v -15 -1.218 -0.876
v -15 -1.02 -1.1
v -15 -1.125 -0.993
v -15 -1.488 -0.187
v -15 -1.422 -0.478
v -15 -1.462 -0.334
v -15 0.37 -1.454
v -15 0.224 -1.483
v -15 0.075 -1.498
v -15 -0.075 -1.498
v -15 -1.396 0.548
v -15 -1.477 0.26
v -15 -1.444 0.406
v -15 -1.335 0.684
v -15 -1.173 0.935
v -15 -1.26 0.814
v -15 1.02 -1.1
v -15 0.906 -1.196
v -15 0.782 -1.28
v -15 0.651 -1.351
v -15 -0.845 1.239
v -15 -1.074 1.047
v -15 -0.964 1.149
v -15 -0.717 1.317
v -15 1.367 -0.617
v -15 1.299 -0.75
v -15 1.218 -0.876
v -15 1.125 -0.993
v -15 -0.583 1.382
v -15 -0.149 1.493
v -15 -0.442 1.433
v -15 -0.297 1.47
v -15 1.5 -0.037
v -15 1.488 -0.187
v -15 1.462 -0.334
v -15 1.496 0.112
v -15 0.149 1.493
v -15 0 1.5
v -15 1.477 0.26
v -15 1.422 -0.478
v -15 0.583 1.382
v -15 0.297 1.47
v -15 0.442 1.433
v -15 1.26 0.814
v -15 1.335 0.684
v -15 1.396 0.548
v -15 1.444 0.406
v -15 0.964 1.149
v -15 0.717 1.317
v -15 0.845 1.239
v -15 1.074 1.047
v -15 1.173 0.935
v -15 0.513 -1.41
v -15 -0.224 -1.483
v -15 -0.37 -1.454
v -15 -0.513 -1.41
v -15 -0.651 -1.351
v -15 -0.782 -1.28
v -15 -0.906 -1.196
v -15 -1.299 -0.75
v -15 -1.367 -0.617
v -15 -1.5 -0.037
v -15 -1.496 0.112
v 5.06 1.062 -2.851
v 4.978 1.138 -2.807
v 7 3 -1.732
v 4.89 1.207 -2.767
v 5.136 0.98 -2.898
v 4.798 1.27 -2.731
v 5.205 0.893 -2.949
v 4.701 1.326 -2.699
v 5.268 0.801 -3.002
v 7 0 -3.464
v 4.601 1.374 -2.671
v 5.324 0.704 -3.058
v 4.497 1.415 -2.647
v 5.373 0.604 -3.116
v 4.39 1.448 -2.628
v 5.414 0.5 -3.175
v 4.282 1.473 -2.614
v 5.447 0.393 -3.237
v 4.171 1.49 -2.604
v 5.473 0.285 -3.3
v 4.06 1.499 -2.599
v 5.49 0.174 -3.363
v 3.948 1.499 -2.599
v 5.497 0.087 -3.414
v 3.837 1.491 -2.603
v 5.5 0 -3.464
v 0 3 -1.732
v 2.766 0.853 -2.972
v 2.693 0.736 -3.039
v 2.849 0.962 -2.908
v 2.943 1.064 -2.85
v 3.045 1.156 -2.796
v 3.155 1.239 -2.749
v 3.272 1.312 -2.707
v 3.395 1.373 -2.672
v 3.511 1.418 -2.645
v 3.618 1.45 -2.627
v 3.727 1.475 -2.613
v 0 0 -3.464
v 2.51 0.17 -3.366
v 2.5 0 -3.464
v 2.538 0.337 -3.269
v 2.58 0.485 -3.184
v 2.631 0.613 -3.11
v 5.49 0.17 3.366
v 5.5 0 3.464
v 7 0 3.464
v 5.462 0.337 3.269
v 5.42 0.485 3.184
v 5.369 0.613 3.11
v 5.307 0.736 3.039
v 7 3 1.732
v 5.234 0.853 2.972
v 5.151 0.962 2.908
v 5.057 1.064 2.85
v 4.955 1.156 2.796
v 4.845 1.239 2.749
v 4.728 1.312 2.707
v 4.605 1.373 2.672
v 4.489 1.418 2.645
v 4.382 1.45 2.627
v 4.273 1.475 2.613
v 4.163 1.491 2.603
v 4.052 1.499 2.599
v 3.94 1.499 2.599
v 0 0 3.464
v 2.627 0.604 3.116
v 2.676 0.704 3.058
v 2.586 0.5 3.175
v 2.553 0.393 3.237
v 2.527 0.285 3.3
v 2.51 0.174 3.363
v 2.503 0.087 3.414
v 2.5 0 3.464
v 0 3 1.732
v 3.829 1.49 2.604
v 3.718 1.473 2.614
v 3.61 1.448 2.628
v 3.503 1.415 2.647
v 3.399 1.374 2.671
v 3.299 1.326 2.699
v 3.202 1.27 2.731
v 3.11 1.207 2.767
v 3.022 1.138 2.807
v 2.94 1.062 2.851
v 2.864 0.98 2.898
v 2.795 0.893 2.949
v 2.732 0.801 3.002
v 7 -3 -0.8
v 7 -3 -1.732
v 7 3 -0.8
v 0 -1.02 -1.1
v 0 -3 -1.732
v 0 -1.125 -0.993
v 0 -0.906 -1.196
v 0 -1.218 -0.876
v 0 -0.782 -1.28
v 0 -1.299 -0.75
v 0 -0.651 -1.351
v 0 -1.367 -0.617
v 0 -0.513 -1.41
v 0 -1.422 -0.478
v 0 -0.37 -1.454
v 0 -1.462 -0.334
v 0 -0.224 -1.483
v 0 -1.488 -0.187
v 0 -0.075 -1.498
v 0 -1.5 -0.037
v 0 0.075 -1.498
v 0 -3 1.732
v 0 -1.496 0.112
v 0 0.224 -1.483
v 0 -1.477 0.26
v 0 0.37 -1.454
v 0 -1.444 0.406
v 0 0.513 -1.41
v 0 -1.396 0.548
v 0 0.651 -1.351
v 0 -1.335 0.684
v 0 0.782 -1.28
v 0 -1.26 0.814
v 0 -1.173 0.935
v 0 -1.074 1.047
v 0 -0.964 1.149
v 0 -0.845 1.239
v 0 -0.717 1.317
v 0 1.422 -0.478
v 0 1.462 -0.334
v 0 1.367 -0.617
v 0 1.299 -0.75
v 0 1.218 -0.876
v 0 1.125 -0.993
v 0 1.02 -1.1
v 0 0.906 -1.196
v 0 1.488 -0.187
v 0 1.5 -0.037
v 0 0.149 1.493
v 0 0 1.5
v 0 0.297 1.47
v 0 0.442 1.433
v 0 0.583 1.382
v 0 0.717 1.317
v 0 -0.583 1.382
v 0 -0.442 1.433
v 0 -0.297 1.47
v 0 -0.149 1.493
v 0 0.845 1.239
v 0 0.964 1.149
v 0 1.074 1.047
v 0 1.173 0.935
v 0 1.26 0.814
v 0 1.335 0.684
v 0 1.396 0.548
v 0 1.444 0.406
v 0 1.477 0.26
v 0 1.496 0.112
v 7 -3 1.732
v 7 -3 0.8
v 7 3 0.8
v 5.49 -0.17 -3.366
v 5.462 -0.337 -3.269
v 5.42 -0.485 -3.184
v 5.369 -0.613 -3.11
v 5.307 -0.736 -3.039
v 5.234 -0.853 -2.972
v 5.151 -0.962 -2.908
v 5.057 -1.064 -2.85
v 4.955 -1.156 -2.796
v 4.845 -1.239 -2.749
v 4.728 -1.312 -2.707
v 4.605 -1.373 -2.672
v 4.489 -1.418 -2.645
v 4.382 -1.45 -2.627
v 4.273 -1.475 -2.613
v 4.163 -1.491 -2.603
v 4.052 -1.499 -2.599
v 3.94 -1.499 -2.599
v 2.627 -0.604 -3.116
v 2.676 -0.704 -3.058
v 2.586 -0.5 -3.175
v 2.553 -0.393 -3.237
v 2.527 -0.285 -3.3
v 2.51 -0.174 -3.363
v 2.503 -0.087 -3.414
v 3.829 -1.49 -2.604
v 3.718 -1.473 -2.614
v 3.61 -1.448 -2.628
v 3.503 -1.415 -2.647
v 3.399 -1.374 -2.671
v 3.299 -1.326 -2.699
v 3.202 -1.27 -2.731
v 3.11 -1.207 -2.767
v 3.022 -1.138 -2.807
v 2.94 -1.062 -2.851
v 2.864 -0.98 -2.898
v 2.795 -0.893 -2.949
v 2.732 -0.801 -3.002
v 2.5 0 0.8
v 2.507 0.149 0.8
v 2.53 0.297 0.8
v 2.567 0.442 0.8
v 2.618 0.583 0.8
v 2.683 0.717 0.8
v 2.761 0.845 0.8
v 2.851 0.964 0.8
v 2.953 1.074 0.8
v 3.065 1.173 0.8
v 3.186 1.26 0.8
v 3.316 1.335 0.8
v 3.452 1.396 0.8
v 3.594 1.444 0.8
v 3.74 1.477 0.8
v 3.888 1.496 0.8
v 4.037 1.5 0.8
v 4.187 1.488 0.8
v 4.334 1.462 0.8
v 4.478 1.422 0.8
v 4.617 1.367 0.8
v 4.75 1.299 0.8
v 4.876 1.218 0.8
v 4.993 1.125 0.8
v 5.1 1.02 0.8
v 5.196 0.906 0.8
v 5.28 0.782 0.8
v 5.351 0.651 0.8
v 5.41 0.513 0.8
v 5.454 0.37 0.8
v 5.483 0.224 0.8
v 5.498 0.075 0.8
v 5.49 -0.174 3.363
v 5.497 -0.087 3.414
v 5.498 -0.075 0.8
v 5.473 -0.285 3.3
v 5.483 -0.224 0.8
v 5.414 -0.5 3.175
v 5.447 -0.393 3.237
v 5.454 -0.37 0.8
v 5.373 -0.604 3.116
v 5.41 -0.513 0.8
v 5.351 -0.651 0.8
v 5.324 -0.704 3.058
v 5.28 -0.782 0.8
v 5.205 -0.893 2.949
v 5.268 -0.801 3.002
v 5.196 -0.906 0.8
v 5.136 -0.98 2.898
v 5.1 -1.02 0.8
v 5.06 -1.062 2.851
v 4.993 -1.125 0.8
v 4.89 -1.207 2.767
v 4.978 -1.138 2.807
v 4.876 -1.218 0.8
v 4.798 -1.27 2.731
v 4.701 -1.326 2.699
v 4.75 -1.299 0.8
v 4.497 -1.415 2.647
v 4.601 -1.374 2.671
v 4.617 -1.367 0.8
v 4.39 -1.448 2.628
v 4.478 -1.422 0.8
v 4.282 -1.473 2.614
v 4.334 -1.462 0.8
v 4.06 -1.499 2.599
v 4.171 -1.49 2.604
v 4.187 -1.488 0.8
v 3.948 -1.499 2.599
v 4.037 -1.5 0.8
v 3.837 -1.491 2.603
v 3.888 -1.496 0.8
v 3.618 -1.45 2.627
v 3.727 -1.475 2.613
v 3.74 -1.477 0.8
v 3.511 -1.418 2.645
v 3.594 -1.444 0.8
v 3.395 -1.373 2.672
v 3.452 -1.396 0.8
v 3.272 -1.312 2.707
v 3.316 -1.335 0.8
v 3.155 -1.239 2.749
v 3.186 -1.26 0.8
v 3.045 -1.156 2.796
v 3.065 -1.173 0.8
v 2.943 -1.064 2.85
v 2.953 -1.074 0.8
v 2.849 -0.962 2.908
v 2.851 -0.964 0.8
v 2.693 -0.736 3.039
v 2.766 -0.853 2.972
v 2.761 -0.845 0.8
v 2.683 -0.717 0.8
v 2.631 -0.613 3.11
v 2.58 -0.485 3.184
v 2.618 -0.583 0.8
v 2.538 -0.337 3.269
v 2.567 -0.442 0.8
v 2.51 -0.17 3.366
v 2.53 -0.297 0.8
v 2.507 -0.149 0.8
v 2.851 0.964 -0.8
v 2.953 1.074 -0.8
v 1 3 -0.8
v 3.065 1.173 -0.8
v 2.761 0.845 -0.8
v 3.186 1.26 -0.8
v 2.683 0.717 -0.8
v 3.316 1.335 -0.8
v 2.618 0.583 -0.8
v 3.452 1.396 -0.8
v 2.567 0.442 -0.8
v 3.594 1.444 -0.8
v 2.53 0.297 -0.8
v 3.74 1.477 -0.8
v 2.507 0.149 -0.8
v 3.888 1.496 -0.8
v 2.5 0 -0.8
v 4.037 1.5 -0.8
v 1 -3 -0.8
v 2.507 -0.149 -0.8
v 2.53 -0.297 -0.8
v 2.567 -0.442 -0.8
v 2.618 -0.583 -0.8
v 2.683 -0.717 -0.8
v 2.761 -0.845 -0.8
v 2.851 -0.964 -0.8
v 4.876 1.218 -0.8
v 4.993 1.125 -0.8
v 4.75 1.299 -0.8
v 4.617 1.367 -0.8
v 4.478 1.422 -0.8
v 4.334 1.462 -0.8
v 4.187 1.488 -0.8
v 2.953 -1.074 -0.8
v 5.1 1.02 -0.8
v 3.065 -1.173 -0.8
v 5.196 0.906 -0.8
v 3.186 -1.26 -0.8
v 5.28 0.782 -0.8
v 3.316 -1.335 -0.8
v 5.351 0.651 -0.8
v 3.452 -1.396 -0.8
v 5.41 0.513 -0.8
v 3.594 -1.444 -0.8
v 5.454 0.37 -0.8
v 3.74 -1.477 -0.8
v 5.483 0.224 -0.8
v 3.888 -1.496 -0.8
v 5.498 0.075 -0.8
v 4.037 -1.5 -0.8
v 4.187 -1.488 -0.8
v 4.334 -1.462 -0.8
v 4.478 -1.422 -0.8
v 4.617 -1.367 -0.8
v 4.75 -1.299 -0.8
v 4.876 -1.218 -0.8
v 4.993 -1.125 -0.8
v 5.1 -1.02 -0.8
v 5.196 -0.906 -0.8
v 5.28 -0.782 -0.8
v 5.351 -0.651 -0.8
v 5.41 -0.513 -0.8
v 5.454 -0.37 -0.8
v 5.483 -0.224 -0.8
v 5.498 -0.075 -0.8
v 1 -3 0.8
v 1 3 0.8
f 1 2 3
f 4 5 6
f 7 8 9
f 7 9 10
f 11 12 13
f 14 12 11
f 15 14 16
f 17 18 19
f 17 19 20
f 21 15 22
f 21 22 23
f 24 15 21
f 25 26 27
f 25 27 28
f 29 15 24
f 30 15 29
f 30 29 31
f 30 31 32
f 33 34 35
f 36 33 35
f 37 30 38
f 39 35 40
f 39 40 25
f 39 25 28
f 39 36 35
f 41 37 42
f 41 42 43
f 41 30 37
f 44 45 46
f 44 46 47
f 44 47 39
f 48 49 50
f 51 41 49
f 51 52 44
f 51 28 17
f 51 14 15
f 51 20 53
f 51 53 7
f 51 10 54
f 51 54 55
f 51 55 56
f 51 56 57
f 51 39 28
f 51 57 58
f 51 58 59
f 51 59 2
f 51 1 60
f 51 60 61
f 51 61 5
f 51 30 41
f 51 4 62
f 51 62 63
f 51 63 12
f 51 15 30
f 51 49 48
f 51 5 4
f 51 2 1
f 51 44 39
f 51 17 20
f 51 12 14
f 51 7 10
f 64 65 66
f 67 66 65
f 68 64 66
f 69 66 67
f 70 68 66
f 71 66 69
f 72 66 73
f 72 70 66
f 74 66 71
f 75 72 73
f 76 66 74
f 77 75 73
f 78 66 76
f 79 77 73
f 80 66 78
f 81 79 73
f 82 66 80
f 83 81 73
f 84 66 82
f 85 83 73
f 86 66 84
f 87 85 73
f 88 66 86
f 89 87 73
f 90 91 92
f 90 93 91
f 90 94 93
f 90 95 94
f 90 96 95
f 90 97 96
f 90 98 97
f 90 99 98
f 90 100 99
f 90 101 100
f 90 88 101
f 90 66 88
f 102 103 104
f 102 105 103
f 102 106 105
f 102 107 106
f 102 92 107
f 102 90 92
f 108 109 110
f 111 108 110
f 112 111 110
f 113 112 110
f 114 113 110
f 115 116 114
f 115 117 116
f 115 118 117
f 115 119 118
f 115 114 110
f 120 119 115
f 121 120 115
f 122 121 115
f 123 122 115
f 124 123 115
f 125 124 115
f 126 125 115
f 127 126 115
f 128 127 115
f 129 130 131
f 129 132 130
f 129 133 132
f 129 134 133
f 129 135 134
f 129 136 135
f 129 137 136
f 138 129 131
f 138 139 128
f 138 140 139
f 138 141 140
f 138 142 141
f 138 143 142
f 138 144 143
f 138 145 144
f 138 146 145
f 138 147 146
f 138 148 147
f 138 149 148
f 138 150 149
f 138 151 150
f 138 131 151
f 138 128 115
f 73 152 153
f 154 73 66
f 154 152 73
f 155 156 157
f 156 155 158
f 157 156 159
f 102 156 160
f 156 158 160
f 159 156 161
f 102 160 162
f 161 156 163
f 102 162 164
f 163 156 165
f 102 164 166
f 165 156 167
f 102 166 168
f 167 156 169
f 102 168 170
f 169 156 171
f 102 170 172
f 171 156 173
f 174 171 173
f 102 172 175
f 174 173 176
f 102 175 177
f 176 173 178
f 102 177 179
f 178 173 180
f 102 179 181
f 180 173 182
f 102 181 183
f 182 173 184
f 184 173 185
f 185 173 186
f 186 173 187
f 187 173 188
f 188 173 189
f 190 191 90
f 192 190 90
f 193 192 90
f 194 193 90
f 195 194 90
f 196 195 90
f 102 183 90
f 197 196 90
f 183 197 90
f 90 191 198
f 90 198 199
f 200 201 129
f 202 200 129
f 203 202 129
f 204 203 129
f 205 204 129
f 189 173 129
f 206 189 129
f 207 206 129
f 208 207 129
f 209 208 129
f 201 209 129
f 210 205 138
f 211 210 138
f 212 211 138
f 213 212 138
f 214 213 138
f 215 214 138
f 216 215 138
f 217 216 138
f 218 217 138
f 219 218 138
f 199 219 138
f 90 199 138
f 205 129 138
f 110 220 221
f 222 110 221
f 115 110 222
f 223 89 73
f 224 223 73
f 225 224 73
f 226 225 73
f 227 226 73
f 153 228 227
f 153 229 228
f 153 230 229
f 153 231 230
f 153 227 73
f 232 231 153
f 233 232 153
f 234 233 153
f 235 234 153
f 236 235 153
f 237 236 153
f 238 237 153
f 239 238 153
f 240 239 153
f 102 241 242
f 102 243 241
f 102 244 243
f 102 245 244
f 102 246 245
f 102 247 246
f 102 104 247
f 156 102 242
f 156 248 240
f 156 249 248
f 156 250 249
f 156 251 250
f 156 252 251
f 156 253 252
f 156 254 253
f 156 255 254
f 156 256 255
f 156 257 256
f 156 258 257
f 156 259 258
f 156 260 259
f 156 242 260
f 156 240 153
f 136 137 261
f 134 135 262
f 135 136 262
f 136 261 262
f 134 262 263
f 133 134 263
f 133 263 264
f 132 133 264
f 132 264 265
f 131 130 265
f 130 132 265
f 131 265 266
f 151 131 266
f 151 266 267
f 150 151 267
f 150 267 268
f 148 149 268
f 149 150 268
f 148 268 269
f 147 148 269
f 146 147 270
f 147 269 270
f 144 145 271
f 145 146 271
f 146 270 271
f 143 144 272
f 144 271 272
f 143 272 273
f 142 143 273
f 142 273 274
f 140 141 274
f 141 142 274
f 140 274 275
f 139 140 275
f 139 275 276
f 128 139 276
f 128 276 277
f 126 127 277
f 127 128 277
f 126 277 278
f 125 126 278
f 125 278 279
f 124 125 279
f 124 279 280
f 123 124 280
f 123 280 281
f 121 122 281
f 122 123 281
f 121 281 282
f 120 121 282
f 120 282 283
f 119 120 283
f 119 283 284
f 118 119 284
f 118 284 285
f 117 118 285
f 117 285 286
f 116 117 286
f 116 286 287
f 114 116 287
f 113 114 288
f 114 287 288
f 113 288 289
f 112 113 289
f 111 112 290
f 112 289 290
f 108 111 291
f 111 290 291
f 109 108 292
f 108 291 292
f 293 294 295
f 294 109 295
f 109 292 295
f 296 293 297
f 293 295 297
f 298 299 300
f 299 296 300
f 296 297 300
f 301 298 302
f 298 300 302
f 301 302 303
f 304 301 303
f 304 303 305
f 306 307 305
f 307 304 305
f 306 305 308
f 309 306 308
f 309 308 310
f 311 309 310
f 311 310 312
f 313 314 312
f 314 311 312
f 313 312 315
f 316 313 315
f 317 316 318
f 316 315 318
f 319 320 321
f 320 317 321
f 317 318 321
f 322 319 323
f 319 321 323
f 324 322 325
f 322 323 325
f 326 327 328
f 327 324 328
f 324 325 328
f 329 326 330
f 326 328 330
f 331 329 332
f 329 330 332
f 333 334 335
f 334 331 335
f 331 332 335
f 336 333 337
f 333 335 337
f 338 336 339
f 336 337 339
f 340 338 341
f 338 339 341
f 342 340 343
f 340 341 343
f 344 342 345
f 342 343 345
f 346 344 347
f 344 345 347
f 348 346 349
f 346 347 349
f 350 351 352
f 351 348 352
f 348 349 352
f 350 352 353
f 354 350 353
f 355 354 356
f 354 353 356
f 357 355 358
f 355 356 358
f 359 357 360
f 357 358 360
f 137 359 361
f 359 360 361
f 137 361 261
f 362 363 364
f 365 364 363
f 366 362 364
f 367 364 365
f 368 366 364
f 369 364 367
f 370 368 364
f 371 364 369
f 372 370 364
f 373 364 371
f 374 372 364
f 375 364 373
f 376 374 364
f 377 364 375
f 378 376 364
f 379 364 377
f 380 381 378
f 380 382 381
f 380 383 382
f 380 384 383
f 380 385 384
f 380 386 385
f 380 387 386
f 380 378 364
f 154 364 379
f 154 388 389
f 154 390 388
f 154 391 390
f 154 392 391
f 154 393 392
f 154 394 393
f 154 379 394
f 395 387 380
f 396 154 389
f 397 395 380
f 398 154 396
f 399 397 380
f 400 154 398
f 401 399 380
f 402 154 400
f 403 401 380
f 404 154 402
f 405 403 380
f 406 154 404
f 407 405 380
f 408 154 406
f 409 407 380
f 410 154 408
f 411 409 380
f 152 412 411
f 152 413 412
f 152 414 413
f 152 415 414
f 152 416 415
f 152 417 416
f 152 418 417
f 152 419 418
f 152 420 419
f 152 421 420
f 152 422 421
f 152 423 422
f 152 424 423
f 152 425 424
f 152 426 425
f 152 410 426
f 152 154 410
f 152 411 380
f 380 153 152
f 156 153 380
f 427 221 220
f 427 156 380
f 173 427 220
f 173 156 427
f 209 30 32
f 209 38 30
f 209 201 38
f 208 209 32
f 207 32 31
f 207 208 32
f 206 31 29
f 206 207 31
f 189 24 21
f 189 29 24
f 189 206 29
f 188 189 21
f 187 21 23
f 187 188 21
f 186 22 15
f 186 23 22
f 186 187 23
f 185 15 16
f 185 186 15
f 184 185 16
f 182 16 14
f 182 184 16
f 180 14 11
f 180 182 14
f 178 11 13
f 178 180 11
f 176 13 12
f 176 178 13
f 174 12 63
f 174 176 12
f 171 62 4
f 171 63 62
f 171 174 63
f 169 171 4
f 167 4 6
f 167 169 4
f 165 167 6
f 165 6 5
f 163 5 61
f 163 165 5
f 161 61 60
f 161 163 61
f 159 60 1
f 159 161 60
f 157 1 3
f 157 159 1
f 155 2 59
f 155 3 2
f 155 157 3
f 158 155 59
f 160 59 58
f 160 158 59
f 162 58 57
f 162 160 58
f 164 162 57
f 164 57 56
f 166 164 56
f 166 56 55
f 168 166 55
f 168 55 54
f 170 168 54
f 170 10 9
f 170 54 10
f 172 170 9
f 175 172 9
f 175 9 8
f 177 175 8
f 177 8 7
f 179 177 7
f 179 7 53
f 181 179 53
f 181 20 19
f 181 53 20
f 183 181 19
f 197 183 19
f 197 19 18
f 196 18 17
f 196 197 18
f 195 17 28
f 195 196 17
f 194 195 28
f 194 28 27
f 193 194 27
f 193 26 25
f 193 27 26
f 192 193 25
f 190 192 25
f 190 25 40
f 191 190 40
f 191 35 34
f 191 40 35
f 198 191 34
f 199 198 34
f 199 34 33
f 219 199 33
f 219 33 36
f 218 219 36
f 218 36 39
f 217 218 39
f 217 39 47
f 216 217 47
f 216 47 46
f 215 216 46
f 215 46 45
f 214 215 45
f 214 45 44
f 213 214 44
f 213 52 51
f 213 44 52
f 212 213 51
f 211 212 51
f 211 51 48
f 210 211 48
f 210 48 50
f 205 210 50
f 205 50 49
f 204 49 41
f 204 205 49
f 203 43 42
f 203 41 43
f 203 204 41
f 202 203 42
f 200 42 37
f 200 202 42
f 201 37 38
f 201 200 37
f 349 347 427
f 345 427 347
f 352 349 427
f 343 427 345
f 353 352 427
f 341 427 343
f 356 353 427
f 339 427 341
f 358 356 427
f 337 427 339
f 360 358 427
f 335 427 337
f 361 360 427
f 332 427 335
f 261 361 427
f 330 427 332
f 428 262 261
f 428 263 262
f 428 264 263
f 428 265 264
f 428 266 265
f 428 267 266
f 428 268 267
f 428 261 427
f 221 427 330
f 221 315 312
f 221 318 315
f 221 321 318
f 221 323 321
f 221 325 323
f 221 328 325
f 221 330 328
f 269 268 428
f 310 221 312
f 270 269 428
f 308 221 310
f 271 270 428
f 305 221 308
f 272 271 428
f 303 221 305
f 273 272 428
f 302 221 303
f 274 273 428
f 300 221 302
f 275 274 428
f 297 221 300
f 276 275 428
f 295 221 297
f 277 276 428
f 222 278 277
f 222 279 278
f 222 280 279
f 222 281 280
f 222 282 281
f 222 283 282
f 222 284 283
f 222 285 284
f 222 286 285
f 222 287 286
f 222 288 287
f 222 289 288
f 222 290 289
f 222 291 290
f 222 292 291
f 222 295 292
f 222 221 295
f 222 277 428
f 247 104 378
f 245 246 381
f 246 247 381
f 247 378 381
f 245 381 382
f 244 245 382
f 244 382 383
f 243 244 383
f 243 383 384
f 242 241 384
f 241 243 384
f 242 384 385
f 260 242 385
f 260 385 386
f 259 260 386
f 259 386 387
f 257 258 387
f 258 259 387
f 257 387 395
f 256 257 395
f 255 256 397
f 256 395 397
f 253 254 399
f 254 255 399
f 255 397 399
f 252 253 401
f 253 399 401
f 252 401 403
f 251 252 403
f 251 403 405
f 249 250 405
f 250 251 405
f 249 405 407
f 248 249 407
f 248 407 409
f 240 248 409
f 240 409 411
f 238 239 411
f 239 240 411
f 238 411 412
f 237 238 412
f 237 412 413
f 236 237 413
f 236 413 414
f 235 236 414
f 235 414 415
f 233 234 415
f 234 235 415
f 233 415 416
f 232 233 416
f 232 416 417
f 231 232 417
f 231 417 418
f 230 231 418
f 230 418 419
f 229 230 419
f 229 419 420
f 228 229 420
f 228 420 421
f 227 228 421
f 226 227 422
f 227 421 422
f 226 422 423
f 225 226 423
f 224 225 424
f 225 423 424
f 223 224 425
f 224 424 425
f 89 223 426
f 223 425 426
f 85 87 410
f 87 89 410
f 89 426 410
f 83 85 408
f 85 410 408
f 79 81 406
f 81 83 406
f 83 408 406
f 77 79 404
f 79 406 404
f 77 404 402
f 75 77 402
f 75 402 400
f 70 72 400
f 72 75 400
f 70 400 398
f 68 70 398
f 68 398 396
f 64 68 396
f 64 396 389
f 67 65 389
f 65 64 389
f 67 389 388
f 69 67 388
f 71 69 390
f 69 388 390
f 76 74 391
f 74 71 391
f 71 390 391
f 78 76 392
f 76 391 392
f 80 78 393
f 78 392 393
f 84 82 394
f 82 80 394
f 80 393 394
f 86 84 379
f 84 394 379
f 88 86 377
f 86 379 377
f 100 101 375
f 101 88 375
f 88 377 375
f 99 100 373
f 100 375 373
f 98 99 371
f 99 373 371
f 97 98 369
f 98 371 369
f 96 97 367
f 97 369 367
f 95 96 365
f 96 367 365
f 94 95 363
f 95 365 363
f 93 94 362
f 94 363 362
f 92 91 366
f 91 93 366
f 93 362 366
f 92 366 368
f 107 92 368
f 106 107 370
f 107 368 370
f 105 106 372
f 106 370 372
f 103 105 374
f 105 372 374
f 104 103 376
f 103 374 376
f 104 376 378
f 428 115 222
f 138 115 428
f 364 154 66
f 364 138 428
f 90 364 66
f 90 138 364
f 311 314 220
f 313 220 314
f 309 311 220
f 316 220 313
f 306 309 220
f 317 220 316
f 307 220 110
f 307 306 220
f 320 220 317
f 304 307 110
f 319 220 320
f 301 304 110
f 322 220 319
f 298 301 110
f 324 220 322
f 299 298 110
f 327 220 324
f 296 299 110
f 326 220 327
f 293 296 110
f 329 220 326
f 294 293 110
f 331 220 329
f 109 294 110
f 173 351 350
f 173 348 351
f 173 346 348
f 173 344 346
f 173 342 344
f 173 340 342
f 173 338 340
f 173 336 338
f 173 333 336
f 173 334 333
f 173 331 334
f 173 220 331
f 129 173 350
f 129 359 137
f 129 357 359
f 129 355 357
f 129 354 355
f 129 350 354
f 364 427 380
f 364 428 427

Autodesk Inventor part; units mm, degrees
ref_plane "YZ Plane" through (0, 0, 0) normal (1, 0, 0) x (0, 1, 0)
ref_plane "XZ Plane" through (0, 0, 0) normal (0, 1, 0) x (-1, 0, 0)
ref_plane "XY Plane" through (0, 0, 0) normal (0, 0, 1) x (1, 0, 0)
sketch "Sketch1" plane through (0, 0, 0) normal (1, 0, 0) x (0, 1, 0)
  line L0 (3, -1.7321) -> (0, -3.4641)
  line L1 (0, -3.4641) -> (-3, -1.7321)
  line L2 (-3, -1.7321) -> (-3, 1.7321)
  line L3 (-3, 1.7321) -> (0, 3.4641)
  line L4 (0, 3.4641) -> (3, 1.7321)
  line L5 (3, 1.7321) -> (3, -1.7321)
  point P0 (0, 0)
  point P1 (0, 0)
  dimension "d0" = 6
extrude "Extrusion1" add sketch "Sketch1" along normal blind 7
sketch "Sketch2" plane through (7, 0, 0) normal (1, 0, 0) x (0, 0, -1)
  line L0 (-0.8, 5) -> (0.8, 5)
  line L1 (0.8, 5) -> (0.8, -5)
  line L2 (0.8, -5) -> (-0.8, -5)
  line L3 (-0.8, -5) -> (-0.8, 5)
  line L4 (-0.8, 5) -> (0.8, -5) construction
  line L5 (0.8, 5) -> (-0.8, -5) construction
  point P0 (0, 0)
  dimension "d3" = 1.6
  dimension "d4" = 10
extrude "Extrusion2" cut sketch "Sketch2" against normal blind 6
sketch "Sketch3" plane through (0, 0, 0) normal (-1, 0, 0) x (0, 0, 1)
  circle A0 centre (0, 0) radius 1.5
  dimension "d7" = 3
extrude "Extrusion3" add sketch "Sketch3" along normal blind 15
thread "Thread1" size "M3x0.5" class "6g" standard "ANSI Metric M Profile" full length
sketch "Sketch4" plane through (7, -3, 0.8) normal (0, 0, -1) x (-1, 0, 0)
  line L0 (0, 6) -> (6, 6) projected
  line L1 (0, 0) -> (0, 6) projected
  line L2 (6, 0) -> (0, 0) projected
  line L3 (6, 0) -> (6, 6) projected
  line L4 (0, 0) -> (0, 6) projected
  circle A0 centre (3, 3) radius 1.5
  point P0 (7, 3)
  point P1 (3, 6)
  point P2 (0, 3)
  dimension "d12" = 3
extrude "Extrusion4" cut sketch "Sketch4" along normal through all both and the other way through all contours A0
properties part number "CompressionRollerArmActuatorScrew" material "Steel, Alloy"
